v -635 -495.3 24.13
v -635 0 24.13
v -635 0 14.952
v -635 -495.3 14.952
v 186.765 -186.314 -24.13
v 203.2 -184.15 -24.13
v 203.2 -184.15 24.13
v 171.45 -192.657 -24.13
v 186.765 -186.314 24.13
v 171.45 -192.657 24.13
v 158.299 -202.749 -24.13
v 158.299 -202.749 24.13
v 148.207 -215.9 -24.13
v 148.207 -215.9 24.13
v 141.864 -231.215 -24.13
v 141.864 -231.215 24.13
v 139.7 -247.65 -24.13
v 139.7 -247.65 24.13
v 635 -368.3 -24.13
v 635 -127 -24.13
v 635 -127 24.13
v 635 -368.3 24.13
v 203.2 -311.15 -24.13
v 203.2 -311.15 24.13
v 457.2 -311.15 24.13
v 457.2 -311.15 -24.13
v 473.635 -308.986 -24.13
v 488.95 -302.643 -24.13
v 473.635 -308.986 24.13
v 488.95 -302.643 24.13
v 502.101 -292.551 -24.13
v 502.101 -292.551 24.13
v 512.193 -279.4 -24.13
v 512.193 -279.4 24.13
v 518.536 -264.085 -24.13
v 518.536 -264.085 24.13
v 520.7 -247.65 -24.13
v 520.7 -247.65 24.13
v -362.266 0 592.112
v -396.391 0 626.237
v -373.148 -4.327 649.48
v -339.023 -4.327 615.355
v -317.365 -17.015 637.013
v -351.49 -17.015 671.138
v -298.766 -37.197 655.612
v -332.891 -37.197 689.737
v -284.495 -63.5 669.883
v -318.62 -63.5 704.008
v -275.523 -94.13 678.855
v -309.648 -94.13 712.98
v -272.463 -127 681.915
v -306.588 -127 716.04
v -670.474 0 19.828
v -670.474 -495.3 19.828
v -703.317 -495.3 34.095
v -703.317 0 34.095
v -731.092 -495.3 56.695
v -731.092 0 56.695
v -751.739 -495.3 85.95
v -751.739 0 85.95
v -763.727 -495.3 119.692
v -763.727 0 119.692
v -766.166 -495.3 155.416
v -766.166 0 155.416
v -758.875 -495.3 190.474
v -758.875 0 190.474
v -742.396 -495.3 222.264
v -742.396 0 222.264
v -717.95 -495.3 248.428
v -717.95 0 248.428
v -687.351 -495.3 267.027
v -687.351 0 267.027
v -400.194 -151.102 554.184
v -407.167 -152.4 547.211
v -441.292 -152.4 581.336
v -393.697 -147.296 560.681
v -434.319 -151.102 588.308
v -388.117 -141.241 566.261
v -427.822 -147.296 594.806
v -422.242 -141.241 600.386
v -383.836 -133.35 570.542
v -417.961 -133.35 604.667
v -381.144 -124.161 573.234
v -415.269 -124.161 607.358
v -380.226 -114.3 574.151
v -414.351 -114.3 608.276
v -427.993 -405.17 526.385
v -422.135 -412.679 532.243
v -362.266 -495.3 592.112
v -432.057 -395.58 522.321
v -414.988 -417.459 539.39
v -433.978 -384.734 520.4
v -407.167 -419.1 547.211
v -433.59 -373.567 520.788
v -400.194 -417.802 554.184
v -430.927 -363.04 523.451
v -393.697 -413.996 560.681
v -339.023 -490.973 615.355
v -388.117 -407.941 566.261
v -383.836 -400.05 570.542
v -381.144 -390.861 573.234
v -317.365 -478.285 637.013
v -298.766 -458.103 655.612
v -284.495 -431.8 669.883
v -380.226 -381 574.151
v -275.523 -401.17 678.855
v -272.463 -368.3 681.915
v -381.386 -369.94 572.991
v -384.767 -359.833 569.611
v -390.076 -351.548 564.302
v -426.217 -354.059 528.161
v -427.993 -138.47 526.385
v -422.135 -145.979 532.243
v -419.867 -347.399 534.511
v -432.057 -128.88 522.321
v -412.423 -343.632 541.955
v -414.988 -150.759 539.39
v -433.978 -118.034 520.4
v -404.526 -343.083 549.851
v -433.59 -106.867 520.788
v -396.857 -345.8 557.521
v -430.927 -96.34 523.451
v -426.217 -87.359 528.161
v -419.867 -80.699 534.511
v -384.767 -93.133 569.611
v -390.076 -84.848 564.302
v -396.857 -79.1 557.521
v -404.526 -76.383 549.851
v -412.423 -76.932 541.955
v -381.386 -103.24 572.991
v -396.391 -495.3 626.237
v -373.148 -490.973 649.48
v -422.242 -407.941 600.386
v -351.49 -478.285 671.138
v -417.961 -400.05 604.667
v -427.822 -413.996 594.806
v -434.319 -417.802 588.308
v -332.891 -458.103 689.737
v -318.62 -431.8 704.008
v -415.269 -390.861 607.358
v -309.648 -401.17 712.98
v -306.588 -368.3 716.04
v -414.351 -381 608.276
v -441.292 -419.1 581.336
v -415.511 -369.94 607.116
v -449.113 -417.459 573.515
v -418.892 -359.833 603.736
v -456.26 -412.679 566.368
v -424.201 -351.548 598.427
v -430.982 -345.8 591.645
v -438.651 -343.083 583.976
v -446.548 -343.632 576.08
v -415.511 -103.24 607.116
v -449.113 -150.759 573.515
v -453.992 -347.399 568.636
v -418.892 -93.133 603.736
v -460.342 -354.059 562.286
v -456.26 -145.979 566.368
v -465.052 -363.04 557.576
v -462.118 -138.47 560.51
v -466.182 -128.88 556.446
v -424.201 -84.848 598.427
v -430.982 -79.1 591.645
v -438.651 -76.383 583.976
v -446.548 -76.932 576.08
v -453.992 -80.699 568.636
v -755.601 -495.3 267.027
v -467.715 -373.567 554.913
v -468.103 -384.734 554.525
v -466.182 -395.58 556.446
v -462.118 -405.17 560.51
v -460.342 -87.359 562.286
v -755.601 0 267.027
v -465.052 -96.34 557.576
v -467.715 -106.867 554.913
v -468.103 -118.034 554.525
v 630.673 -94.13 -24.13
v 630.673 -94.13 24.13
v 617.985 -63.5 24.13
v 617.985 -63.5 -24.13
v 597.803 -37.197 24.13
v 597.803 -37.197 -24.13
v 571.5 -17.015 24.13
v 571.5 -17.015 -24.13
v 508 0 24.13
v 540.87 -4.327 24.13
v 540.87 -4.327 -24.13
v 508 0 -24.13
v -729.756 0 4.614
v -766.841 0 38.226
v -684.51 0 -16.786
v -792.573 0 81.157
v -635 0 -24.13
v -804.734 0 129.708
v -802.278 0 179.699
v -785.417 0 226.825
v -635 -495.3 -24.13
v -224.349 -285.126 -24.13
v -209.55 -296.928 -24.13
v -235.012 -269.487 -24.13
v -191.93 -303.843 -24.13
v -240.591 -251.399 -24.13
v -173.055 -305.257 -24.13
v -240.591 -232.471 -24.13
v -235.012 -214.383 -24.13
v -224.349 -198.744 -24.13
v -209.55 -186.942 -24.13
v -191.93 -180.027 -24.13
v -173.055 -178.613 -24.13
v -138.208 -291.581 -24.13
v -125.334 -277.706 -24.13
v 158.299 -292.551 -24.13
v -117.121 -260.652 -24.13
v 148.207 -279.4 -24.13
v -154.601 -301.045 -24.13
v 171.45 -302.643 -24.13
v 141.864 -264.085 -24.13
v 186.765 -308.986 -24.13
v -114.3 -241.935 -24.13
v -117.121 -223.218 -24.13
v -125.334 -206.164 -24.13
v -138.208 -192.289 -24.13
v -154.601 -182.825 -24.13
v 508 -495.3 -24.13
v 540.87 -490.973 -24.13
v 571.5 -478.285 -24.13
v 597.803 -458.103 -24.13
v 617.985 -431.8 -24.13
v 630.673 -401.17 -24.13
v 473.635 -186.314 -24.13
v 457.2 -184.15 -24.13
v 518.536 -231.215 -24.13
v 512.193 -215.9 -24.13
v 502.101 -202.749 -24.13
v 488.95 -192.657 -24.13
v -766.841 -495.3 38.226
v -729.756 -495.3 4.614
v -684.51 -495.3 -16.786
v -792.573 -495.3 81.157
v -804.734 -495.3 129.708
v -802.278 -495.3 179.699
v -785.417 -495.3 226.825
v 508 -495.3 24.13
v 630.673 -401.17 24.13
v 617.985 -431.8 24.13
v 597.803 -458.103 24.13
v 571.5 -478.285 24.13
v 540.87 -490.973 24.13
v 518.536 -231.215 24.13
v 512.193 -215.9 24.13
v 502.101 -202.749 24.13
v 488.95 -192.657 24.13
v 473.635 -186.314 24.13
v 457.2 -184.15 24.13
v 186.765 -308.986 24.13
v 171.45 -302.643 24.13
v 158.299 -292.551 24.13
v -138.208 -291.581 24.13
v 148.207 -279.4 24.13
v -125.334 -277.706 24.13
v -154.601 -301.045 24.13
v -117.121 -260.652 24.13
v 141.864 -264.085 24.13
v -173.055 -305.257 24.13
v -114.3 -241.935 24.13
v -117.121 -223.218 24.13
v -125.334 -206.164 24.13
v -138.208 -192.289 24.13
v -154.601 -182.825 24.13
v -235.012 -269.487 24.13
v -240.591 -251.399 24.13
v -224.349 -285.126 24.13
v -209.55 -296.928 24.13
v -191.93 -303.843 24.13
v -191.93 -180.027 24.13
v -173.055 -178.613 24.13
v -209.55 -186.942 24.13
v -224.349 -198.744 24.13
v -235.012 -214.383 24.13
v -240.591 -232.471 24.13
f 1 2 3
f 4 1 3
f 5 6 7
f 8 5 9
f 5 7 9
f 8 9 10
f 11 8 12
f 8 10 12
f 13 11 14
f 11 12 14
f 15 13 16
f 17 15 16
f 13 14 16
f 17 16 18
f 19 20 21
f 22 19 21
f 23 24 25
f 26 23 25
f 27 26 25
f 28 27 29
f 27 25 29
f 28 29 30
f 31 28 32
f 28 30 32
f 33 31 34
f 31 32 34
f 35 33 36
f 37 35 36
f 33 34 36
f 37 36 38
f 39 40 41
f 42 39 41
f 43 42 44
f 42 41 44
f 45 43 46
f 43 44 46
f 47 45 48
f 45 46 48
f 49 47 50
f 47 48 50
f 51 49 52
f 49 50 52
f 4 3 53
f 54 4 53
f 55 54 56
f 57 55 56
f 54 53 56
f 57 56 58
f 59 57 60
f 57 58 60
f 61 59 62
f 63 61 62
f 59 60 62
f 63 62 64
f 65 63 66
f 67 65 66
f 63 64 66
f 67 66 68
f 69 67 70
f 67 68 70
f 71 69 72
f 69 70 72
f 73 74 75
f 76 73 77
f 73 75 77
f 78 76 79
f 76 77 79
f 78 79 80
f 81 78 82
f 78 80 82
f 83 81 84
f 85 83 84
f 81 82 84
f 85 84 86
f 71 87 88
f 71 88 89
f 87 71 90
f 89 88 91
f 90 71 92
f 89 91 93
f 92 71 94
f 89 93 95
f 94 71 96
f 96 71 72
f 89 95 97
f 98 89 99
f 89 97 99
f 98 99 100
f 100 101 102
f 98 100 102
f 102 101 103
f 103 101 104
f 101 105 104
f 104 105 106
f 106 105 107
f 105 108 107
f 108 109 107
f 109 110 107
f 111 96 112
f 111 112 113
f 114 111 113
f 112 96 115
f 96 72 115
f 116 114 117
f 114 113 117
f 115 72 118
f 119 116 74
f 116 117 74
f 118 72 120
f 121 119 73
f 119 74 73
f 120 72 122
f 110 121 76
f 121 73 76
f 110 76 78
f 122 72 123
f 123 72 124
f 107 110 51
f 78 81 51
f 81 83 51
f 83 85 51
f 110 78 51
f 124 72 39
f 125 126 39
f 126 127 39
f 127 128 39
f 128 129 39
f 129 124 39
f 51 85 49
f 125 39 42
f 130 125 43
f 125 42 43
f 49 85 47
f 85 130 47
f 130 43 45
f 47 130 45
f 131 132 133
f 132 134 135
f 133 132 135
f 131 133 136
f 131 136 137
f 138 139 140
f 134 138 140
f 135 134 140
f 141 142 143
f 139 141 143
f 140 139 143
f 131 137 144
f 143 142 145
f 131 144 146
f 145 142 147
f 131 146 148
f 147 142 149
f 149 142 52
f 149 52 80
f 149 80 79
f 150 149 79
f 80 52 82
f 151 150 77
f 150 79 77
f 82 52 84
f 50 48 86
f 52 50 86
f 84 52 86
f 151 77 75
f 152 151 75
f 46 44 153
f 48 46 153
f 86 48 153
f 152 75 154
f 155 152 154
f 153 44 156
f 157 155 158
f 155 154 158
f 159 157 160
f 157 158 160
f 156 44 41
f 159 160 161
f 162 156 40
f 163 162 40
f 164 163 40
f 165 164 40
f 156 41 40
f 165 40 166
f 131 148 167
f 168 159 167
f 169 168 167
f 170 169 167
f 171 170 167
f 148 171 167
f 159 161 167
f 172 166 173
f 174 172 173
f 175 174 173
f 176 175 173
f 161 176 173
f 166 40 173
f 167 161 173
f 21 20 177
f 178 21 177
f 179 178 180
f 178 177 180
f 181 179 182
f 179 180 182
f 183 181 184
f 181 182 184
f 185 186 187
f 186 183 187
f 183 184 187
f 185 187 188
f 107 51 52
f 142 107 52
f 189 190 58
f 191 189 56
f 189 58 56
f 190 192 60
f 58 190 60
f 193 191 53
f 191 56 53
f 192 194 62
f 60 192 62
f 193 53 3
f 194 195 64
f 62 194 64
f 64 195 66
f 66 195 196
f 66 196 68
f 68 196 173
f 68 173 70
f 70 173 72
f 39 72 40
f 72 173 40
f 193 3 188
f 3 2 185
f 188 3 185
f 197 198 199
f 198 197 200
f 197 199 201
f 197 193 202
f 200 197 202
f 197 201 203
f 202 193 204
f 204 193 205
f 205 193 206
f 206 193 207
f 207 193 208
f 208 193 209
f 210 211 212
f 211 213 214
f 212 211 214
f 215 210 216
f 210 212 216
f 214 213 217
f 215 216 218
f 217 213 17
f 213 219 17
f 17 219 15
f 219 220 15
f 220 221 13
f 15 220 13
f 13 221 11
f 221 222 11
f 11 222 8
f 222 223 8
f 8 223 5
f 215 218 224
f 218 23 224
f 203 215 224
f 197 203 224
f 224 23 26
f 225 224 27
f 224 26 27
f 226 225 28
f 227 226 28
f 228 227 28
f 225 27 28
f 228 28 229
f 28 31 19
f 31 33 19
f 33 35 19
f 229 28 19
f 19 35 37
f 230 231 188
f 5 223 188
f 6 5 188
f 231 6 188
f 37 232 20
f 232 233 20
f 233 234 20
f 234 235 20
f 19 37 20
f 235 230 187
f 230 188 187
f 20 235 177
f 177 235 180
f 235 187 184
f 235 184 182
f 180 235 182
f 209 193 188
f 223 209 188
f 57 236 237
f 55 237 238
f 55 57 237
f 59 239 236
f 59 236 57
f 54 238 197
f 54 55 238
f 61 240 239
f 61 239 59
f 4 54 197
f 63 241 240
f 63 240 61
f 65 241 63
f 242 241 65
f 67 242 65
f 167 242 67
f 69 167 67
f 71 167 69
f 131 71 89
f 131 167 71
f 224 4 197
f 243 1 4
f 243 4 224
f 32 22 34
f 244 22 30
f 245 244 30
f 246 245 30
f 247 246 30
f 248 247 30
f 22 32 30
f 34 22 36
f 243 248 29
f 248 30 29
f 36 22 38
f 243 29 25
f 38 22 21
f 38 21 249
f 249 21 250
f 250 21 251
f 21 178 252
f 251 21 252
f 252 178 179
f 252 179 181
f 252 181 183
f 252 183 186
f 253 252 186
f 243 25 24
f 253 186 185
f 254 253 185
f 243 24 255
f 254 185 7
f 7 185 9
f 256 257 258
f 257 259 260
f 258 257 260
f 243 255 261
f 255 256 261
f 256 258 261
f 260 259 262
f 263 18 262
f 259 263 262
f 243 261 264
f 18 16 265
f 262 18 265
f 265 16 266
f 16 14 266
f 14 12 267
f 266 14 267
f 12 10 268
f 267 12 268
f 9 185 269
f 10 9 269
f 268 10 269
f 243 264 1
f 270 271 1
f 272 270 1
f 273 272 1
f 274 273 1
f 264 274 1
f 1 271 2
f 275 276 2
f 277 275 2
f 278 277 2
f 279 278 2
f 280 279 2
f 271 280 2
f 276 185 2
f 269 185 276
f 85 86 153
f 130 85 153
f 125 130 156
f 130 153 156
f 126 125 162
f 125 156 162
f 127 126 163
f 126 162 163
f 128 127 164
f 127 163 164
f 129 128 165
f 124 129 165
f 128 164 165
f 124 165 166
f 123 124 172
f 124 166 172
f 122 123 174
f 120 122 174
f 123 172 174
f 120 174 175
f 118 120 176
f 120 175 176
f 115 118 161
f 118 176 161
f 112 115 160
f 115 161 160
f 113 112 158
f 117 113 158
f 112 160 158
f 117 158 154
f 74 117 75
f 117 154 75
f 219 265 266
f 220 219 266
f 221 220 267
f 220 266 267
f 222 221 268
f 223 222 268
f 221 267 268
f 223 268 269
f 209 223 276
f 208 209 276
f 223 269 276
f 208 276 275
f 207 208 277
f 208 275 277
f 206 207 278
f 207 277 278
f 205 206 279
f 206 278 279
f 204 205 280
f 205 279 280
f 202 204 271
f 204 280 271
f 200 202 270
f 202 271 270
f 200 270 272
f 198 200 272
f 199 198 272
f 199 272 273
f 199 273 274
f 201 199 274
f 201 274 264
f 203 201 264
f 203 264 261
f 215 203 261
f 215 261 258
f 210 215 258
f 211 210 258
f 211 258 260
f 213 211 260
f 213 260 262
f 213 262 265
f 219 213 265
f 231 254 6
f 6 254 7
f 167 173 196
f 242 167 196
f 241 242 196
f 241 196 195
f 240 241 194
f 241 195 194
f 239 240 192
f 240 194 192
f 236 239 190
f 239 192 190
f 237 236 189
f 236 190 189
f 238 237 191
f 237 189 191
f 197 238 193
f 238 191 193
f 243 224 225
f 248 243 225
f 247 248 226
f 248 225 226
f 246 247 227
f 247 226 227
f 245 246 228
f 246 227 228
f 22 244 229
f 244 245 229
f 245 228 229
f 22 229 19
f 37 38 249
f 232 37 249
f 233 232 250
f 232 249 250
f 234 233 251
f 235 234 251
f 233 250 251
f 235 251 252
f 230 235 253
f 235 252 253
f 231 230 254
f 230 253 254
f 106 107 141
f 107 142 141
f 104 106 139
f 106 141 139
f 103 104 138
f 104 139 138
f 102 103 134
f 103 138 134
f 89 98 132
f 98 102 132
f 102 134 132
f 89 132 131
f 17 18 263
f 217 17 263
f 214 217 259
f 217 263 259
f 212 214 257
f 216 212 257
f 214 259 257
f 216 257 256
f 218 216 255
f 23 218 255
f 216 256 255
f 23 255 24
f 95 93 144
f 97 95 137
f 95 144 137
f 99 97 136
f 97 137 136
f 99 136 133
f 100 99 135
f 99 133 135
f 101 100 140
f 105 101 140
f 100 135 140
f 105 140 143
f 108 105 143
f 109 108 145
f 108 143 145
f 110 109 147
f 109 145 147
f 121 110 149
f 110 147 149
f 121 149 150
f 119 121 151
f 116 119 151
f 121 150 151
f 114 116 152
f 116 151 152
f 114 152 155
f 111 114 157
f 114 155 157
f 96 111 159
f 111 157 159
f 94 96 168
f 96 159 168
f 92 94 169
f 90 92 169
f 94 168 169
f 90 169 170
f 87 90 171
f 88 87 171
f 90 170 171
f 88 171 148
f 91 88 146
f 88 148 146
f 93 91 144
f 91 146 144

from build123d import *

# Parameters (mm, degrees)
F1_DEPTH  = 495.3
F3_DEPTH  = 101.6
F4_R      = 63.5
F5_DEPTH  = 101.6
F7_DEPTH  = 127
F9_DEPTH  = 127
F11_DEPTH = 127
F13_DEPTH = 127


with BuildPart() as f1:
    # F0 (on Front) → F1 (new body)
    with BuildSketch(Plane.XZ):
        Polygon((635, -24.13), (635, 24.13), (-635, 24.13), (-635, 14.952256), (-635, -24.13), align=None)
        with BuildLine():
            Line((-635, -24.13), (-635, 14.952256))
            ThreePointArc((-635, 14.952256), (-763.72663, 119.691568), (-687.35112, 267.026731))
            Line((-687.35112, 267.026731), (-272.463288, 681.914564))
            Line((-272.463288, 681.914564), (-306.588261, 716.039537))
            Line((-306.588261, 716.039537), (-755.601067, 267.026731))
            ThreePointArc((-755.601067, 267.026731), (-792.572888, 81.156837), (-635, -24.13))
        make_face()
    extrude(amount=F1_DEPTH)

    # F2 (on face) → F3 (cut)
    with BuildSketch(Plane(origin=(-511.313899, 0, 511.313899), x_dir=(0, -1, 0), z_dir=(-0.707107, 0, 0.707107))):
        with BuildLine():
            ThreePointArc((152.4, 99.025774), (141.240768, 125.966543), (114.3, 137.125774))
            ThreePointArc((114.3, 137.125774), (87.359232, 72.085006), (152.4, 99.025774))
        make_face()
        with BuildLine():
            ThreePointArc((419.1, 99.025774), (407.940768, 125.966543), (381, 137.125774))
            ThreePointArc((381, 137.125774), (354.059232, 72.085006), (419.1, 99.025774))
        make_face()
    extrude(amount=-F3_DEPTH, mode=Mode.SUBTRACT)

    # F4 (on face) → F5 (cut)
    with BuildSketch(Plane.XY.offset(24.13)):
        with Locations((-177.8, -241.935)):
            Circle(F4_R)
        with BuildLine():
            Line((139.7, -247.65), (520.7, -247.65))
            ThreePointArc((520.7, -247.65), (502.101281, -202.748719), (457.2, -184.15))
            Line((457.2, -184.15), (203.2, -184.15))
            ThreePointArc((203.2, -184.15), (158.298719, -202.748719), (139.7, -247.65))
        make_face()
        with BuildLine():
            ThreePointArc((457.2, -311.15), (502.101281, -292.551281), (520.7, -247.65))
            Line((520.7, -247.65), (139.7, -247.65))
            ThreePointArc((139.7, -247.65), (158.298719, -292.551281), (203.2, -311.15))
            Line((203.2, -311.15), (457.2, -311.15))
        make_face()
    extrude(amount=-F5_DEPTH, mode=Mode.SUBTRACT)

    # F6 (on face) → F7 (cut)
    with BuildSketch(Plane(origin=(-511.313899, 0, 511.313899), x_dir=(0, -1, 0), z_dir=(-0.707107, 0, 0.707107))):
        with BuildLine():
            Line((127, 289.525774), (0, 289.525774))
            Line((0, 289.525774), (0, 162.525774))
            ThreePointArc((0, 162.525774), (37.197439, 252.328335), (127, 289.525774))
        make_face()
    extrude(amount=-F7_DEPTH, mode=Mode.SUBTRACT)

    # F8 (on face) → F9 (cut)
    with BuildSketch(Plane(origin=(-511.313899, 0, 511.313899), x_dir=(0, -1, 0), z_dir=(-0.707107, 0, 0.707107))):
        with BuildLine():
            Line((495.3, 162.525774), (495.3, 289.525774))
            Line((495.3, 289.525774), (368.3, 289.525774))
            ThreePointArc((368.3, 289.525774), (458.102561, 252.328335), (495.3, 162.525774))
        make_face()
    extrude(amount=-F9_DEPTH, mode=Mode.SUBTRACT)

    # F10 (on face) → F11 (cut)
    with BuildSketch(Plane(origin=(0, 0, -24.13), x_dir=(1, 0, 0), z_dir=(0, 0, -1))):
        with BuildLine():
            Line((635, 368.3), (635, 495.3))
            Line((635, 495.3), (508, 495.3))
            ThreePointArc((508, 495.3), (597.802561, 458.102561), (635, 368.3))
        make_face()
    extrude(amount=-F11_DEPTH, mode=Mode.SUBTRACT)

    # F12 (on face) → F13 (cut)
    with BuildSketch(Plane(origin=(0, 0, -24.13), x_dir=(1, 0, 0), z_dir=(0, 0, -1))):
        with BuildLine():
            Line((508, 0), (635, 0))
            Line((635, 0), (635, 127))
            ThreePointArc((635, 127), (597.802561, 37.197439), (508, 0))
        make_face()
    extrude(amount=-F13_DEPTH, mode=Mode.SUBTRACT)


solid = f1.part
